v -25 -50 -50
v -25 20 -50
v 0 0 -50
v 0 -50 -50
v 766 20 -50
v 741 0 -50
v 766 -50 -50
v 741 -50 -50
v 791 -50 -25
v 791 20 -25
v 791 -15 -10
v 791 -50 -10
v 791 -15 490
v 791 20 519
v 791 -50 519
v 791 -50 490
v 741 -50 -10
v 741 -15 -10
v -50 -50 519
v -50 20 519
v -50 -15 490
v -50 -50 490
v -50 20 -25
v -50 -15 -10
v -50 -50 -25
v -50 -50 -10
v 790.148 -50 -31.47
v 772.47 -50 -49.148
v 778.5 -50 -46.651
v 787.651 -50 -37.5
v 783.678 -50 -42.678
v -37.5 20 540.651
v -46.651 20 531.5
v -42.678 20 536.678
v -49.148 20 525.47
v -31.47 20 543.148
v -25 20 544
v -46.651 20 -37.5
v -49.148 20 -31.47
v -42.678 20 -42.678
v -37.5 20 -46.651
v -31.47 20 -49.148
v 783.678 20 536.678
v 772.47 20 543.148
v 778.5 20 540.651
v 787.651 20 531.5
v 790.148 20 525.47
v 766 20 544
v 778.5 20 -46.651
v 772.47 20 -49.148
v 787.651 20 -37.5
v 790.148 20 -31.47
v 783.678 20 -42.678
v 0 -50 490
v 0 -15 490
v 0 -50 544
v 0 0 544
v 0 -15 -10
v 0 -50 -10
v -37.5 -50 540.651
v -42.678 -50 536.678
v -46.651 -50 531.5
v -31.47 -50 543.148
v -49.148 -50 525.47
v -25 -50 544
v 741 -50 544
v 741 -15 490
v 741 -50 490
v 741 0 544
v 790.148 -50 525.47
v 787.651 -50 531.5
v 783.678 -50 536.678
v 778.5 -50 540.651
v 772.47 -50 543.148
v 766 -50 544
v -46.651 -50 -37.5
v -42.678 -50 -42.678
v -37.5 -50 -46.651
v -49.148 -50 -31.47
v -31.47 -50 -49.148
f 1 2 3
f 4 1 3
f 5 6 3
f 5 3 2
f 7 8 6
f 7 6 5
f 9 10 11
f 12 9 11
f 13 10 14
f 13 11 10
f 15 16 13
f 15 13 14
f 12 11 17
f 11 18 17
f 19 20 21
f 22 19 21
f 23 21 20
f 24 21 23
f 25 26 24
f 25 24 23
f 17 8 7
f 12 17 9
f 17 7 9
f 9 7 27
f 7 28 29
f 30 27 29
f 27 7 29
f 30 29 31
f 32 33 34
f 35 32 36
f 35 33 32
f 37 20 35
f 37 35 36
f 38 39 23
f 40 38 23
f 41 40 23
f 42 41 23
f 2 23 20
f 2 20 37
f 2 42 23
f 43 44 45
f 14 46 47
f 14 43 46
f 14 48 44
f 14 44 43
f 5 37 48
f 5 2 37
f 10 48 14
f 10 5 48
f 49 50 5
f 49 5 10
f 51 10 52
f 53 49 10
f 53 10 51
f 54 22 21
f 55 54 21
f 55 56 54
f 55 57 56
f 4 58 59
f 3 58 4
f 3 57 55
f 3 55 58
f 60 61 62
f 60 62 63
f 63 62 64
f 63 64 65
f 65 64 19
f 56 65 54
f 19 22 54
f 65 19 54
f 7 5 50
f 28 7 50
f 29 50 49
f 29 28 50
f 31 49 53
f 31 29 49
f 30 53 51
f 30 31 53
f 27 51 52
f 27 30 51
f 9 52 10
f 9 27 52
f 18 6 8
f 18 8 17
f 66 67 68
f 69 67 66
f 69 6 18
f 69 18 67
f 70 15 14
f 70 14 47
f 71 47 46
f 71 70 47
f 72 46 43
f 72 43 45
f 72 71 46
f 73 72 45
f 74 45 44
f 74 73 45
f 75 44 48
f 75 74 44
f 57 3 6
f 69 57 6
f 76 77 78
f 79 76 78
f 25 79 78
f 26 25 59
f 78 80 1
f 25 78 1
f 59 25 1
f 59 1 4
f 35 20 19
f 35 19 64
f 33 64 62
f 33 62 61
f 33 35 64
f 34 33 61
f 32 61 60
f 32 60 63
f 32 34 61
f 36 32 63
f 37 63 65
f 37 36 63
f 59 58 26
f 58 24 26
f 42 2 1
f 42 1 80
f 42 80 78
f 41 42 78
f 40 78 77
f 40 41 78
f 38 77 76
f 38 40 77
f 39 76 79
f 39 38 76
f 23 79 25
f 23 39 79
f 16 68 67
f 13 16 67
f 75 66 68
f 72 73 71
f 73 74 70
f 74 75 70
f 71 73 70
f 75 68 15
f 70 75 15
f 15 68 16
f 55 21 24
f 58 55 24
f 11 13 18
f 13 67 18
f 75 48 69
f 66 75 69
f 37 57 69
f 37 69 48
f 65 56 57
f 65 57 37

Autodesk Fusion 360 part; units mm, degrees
sketch "Esquisse1" plane through (0, 0, 0) normal (0, 1, 0) x (1, 0, 0)
  line L0 (-50, 50) -> (791, 50)
  line L1 (791, 50) -> (791, -544)
  line L2 (791, -544) -> (-50, -544)
  line L3 (-50, -544) -> (-50, 50)
  dimension "d1" = 594
  dimension "d2" = 841
extrude "Extrusion1" add sketch "Esquisse1" along normal blind 20
sketch "Esquisse3" plane through (0, 0, 0) normal (0, 1, 0) x (1, 0, 0)
  line L0 (-50, -544) -> (0, -544)
  line L1 (0, -544) -> (0, 50)
  line L2 (0, 50) -> (-50, 50)
  line L3 (-50, 50) -> (-50, -544)
  line L4 (741, -544) -> (791, -544)
  line L5 (791, -544) -> (791, 50)
  line L6 (791, 50) -> (741, 50)
  line L7 (741, 50) -> (741, -544)
  point P0 (-50, -544)
  point P1 (791, -544)
  point P2 (-25, -247)
  point P3 (766, -247)
  dimension "d7" = 50
  dimension "d8" = 594
  dimension "d9" = 50
  dimension "d10" = 594
extrude "Extrusion2" add sketch "Esquisse3" against normal blind 50
sketch "Esquisse8" plane through (0, 0, 0) normal (1, 0, 0) x (0, 0, -1)
  line L0 (-490, -15) -> (10, -15)
  line L1 (10, -15) -> (10, -50)
  line L2 (10, -50) -> (-490, -50)
  line L3 (-490, -50) -> (-490, -15)
  dimension "d17" = 35
  dimension "d18" = 500
extrude "Extrusion3" cut sketch "Esquisse8" along normal mid plane 1850
fillet "Congé1" radius 25 4 edges at (-50, -15, 544) (-50, -15, -50) (791, -15, 544) (791, -15, -50)
